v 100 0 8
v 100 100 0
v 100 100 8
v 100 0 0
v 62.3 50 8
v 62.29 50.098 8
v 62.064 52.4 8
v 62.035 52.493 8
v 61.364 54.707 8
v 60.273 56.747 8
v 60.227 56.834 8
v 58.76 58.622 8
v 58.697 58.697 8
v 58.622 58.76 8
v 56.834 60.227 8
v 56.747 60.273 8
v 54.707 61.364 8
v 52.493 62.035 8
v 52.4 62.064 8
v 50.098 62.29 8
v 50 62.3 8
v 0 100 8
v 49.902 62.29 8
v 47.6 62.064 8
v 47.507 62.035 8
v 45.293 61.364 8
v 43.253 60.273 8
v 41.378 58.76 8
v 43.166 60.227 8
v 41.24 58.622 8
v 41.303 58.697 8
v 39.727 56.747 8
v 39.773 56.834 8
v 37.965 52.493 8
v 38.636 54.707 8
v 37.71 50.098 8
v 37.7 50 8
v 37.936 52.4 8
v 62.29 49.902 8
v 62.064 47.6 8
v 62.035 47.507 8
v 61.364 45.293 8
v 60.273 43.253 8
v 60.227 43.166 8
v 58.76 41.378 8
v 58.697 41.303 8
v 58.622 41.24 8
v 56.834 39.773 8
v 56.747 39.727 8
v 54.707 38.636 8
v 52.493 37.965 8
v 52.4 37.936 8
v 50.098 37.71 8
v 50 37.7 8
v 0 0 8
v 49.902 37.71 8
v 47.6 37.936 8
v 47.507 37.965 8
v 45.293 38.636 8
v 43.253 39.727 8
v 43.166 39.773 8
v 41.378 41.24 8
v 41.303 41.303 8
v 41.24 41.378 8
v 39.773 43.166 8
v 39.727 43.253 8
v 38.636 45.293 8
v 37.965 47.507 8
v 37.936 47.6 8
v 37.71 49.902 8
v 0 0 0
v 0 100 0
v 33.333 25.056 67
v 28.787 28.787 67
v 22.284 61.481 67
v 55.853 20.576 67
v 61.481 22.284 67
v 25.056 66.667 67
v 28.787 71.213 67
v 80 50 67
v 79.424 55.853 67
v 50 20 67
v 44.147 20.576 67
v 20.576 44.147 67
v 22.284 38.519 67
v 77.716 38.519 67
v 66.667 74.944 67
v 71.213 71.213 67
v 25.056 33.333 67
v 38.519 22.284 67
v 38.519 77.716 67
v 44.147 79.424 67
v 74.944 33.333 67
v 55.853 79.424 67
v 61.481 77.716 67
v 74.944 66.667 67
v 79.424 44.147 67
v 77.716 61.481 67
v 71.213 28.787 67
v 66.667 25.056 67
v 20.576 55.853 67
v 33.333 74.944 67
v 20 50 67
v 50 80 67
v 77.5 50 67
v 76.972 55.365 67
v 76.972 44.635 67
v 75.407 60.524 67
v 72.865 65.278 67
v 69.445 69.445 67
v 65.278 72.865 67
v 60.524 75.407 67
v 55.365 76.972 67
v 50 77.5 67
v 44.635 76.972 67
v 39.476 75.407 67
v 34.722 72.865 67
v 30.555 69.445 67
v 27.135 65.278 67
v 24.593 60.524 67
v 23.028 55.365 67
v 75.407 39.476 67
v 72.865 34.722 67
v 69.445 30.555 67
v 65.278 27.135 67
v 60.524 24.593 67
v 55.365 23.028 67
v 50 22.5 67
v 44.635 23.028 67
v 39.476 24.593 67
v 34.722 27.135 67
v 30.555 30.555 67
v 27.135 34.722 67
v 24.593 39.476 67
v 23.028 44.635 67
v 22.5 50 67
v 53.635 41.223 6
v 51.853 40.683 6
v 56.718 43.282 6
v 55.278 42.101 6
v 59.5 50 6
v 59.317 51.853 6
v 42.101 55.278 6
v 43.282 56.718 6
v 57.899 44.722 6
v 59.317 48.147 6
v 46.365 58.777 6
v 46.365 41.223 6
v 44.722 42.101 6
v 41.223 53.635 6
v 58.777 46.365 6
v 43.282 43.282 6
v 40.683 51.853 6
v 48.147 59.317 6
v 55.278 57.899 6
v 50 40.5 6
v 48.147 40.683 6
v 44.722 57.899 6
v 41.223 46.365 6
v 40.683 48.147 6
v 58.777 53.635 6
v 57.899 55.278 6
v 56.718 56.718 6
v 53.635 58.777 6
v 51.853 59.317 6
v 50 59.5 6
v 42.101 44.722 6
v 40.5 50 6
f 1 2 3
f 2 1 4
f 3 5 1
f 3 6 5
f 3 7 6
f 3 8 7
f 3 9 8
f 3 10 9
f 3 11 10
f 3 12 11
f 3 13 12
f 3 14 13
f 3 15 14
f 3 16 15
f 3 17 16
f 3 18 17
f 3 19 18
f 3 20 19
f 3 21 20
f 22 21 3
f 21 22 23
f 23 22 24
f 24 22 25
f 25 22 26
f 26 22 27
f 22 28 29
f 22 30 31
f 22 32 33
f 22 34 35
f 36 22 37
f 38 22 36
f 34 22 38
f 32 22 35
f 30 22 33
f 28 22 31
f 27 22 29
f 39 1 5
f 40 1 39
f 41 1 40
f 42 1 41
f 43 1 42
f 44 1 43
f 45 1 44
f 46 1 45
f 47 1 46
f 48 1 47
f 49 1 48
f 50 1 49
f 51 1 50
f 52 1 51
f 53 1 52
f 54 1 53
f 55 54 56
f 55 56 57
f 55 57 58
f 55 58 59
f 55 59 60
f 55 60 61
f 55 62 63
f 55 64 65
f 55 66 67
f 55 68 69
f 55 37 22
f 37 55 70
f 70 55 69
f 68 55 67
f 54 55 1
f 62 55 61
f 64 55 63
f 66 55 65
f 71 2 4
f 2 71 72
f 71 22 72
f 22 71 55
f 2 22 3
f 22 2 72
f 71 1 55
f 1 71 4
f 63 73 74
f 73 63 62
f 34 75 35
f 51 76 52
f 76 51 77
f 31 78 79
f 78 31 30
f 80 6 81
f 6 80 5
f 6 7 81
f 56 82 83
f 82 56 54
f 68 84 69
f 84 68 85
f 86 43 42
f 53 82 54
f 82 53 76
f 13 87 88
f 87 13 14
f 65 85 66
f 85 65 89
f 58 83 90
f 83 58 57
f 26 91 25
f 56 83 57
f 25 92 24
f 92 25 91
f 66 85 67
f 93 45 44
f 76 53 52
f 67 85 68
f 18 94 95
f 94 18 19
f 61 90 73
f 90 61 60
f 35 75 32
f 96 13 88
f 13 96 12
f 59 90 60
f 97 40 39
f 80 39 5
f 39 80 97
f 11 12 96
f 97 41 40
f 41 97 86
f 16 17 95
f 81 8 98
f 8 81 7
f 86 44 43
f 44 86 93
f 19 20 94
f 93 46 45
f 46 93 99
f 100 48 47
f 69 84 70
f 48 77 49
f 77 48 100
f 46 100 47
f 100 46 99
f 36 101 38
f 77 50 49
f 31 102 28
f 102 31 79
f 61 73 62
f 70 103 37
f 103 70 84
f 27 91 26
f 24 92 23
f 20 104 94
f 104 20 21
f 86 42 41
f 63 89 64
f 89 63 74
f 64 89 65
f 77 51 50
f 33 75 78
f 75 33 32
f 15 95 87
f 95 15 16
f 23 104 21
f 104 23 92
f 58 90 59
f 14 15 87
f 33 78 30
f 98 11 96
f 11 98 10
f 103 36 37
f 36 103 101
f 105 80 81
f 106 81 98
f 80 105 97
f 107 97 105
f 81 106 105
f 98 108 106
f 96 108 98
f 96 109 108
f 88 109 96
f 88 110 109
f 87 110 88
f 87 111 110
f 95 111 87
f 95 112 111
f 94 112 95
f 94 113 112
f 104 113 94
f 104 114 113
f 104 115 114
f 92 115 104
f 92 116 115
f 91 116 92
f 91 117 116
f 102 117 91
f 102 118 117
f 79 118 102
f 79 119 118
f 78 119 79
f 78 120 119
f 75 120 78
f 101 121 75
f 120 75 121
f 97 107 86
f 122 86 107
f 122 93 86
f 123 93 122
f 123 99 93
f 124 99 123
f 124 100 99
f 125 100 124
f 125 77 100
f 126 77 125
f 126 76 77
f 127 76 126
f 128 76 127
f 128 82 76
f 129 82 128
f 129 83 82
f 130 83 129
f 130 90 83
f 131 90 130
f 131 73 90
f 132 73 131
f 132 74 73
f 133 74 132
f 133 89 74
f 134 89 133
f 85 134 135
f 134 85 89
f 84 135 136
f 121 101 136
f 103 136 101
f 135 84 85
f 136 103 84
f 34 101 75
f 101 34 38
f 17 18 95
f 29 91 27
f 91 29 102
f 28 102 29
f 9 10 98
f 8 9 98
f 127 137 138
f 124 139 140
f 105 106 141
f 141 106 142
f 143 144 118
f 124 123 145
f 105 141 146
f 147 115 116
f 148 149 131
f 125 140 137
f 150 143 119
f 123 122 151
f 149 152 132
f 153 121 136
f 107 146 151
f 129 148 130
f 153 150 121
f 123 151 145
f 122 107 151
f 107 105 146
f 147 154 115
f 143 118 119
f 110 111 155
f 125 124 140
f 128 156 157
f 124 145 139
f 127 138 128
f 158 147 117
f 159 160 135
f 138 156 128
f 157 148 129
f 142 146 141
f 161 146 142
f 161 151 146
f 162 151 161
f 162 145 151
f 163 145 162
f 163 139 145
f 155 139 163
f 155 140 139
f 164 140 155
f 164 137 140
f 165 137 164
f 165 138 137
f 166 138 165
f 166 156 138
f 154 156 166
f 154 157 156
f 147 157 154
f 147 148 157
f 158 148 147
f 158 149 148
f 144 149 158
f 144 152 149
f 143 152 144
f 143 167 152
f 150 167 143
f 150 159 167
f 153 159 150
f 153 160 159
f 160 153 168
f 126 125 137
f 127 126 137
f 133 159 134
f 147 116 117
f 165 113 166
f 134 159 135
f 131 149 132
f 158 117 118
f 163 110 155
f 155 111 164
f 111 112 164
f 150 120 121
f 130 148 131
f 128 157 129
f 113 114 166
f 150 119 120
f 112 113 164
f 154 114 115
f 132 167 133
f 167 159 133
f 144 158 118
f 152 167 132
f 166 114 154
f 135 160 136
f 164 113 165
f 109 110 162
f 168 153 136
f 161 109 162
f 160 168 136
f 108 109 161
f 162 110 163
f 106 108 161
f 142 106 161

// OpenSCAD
$fn = 32;

// ----------------------------------------------------------------------
// Hopper: funnel with square flange
// ----------------------------------------------------------------------

// --- parameters (mm) ---
fl = 100;                 // flange side, X and Y
fl_t = 8;                 // flange thickness
cone_h = 60;              // cone height above the flange
top_d = 60;               // cone mouth diameter
bot_d = 24;               // cone spout diameter
wall = 2.5;               // cone wall thickness

bore_d = bot_d - 2 * wall;  // spout bore diameter
total_h = fl_t + cone_h - 1;  // overall height

difference() {
  union() {
    cube([fl, fl, fl_t]);
    translate([fl / 2, fl / 2, fl_t - 1])
      cylinder(h = cone_h, d1 = bot_d, d2 = top_d);
  }
  translate([fl / 2, fl / 2, fl_t - 2])
    cylinder(h = cone_h + 1, d1 = bore_d, d2 = top_d - 2 * wall);
}
